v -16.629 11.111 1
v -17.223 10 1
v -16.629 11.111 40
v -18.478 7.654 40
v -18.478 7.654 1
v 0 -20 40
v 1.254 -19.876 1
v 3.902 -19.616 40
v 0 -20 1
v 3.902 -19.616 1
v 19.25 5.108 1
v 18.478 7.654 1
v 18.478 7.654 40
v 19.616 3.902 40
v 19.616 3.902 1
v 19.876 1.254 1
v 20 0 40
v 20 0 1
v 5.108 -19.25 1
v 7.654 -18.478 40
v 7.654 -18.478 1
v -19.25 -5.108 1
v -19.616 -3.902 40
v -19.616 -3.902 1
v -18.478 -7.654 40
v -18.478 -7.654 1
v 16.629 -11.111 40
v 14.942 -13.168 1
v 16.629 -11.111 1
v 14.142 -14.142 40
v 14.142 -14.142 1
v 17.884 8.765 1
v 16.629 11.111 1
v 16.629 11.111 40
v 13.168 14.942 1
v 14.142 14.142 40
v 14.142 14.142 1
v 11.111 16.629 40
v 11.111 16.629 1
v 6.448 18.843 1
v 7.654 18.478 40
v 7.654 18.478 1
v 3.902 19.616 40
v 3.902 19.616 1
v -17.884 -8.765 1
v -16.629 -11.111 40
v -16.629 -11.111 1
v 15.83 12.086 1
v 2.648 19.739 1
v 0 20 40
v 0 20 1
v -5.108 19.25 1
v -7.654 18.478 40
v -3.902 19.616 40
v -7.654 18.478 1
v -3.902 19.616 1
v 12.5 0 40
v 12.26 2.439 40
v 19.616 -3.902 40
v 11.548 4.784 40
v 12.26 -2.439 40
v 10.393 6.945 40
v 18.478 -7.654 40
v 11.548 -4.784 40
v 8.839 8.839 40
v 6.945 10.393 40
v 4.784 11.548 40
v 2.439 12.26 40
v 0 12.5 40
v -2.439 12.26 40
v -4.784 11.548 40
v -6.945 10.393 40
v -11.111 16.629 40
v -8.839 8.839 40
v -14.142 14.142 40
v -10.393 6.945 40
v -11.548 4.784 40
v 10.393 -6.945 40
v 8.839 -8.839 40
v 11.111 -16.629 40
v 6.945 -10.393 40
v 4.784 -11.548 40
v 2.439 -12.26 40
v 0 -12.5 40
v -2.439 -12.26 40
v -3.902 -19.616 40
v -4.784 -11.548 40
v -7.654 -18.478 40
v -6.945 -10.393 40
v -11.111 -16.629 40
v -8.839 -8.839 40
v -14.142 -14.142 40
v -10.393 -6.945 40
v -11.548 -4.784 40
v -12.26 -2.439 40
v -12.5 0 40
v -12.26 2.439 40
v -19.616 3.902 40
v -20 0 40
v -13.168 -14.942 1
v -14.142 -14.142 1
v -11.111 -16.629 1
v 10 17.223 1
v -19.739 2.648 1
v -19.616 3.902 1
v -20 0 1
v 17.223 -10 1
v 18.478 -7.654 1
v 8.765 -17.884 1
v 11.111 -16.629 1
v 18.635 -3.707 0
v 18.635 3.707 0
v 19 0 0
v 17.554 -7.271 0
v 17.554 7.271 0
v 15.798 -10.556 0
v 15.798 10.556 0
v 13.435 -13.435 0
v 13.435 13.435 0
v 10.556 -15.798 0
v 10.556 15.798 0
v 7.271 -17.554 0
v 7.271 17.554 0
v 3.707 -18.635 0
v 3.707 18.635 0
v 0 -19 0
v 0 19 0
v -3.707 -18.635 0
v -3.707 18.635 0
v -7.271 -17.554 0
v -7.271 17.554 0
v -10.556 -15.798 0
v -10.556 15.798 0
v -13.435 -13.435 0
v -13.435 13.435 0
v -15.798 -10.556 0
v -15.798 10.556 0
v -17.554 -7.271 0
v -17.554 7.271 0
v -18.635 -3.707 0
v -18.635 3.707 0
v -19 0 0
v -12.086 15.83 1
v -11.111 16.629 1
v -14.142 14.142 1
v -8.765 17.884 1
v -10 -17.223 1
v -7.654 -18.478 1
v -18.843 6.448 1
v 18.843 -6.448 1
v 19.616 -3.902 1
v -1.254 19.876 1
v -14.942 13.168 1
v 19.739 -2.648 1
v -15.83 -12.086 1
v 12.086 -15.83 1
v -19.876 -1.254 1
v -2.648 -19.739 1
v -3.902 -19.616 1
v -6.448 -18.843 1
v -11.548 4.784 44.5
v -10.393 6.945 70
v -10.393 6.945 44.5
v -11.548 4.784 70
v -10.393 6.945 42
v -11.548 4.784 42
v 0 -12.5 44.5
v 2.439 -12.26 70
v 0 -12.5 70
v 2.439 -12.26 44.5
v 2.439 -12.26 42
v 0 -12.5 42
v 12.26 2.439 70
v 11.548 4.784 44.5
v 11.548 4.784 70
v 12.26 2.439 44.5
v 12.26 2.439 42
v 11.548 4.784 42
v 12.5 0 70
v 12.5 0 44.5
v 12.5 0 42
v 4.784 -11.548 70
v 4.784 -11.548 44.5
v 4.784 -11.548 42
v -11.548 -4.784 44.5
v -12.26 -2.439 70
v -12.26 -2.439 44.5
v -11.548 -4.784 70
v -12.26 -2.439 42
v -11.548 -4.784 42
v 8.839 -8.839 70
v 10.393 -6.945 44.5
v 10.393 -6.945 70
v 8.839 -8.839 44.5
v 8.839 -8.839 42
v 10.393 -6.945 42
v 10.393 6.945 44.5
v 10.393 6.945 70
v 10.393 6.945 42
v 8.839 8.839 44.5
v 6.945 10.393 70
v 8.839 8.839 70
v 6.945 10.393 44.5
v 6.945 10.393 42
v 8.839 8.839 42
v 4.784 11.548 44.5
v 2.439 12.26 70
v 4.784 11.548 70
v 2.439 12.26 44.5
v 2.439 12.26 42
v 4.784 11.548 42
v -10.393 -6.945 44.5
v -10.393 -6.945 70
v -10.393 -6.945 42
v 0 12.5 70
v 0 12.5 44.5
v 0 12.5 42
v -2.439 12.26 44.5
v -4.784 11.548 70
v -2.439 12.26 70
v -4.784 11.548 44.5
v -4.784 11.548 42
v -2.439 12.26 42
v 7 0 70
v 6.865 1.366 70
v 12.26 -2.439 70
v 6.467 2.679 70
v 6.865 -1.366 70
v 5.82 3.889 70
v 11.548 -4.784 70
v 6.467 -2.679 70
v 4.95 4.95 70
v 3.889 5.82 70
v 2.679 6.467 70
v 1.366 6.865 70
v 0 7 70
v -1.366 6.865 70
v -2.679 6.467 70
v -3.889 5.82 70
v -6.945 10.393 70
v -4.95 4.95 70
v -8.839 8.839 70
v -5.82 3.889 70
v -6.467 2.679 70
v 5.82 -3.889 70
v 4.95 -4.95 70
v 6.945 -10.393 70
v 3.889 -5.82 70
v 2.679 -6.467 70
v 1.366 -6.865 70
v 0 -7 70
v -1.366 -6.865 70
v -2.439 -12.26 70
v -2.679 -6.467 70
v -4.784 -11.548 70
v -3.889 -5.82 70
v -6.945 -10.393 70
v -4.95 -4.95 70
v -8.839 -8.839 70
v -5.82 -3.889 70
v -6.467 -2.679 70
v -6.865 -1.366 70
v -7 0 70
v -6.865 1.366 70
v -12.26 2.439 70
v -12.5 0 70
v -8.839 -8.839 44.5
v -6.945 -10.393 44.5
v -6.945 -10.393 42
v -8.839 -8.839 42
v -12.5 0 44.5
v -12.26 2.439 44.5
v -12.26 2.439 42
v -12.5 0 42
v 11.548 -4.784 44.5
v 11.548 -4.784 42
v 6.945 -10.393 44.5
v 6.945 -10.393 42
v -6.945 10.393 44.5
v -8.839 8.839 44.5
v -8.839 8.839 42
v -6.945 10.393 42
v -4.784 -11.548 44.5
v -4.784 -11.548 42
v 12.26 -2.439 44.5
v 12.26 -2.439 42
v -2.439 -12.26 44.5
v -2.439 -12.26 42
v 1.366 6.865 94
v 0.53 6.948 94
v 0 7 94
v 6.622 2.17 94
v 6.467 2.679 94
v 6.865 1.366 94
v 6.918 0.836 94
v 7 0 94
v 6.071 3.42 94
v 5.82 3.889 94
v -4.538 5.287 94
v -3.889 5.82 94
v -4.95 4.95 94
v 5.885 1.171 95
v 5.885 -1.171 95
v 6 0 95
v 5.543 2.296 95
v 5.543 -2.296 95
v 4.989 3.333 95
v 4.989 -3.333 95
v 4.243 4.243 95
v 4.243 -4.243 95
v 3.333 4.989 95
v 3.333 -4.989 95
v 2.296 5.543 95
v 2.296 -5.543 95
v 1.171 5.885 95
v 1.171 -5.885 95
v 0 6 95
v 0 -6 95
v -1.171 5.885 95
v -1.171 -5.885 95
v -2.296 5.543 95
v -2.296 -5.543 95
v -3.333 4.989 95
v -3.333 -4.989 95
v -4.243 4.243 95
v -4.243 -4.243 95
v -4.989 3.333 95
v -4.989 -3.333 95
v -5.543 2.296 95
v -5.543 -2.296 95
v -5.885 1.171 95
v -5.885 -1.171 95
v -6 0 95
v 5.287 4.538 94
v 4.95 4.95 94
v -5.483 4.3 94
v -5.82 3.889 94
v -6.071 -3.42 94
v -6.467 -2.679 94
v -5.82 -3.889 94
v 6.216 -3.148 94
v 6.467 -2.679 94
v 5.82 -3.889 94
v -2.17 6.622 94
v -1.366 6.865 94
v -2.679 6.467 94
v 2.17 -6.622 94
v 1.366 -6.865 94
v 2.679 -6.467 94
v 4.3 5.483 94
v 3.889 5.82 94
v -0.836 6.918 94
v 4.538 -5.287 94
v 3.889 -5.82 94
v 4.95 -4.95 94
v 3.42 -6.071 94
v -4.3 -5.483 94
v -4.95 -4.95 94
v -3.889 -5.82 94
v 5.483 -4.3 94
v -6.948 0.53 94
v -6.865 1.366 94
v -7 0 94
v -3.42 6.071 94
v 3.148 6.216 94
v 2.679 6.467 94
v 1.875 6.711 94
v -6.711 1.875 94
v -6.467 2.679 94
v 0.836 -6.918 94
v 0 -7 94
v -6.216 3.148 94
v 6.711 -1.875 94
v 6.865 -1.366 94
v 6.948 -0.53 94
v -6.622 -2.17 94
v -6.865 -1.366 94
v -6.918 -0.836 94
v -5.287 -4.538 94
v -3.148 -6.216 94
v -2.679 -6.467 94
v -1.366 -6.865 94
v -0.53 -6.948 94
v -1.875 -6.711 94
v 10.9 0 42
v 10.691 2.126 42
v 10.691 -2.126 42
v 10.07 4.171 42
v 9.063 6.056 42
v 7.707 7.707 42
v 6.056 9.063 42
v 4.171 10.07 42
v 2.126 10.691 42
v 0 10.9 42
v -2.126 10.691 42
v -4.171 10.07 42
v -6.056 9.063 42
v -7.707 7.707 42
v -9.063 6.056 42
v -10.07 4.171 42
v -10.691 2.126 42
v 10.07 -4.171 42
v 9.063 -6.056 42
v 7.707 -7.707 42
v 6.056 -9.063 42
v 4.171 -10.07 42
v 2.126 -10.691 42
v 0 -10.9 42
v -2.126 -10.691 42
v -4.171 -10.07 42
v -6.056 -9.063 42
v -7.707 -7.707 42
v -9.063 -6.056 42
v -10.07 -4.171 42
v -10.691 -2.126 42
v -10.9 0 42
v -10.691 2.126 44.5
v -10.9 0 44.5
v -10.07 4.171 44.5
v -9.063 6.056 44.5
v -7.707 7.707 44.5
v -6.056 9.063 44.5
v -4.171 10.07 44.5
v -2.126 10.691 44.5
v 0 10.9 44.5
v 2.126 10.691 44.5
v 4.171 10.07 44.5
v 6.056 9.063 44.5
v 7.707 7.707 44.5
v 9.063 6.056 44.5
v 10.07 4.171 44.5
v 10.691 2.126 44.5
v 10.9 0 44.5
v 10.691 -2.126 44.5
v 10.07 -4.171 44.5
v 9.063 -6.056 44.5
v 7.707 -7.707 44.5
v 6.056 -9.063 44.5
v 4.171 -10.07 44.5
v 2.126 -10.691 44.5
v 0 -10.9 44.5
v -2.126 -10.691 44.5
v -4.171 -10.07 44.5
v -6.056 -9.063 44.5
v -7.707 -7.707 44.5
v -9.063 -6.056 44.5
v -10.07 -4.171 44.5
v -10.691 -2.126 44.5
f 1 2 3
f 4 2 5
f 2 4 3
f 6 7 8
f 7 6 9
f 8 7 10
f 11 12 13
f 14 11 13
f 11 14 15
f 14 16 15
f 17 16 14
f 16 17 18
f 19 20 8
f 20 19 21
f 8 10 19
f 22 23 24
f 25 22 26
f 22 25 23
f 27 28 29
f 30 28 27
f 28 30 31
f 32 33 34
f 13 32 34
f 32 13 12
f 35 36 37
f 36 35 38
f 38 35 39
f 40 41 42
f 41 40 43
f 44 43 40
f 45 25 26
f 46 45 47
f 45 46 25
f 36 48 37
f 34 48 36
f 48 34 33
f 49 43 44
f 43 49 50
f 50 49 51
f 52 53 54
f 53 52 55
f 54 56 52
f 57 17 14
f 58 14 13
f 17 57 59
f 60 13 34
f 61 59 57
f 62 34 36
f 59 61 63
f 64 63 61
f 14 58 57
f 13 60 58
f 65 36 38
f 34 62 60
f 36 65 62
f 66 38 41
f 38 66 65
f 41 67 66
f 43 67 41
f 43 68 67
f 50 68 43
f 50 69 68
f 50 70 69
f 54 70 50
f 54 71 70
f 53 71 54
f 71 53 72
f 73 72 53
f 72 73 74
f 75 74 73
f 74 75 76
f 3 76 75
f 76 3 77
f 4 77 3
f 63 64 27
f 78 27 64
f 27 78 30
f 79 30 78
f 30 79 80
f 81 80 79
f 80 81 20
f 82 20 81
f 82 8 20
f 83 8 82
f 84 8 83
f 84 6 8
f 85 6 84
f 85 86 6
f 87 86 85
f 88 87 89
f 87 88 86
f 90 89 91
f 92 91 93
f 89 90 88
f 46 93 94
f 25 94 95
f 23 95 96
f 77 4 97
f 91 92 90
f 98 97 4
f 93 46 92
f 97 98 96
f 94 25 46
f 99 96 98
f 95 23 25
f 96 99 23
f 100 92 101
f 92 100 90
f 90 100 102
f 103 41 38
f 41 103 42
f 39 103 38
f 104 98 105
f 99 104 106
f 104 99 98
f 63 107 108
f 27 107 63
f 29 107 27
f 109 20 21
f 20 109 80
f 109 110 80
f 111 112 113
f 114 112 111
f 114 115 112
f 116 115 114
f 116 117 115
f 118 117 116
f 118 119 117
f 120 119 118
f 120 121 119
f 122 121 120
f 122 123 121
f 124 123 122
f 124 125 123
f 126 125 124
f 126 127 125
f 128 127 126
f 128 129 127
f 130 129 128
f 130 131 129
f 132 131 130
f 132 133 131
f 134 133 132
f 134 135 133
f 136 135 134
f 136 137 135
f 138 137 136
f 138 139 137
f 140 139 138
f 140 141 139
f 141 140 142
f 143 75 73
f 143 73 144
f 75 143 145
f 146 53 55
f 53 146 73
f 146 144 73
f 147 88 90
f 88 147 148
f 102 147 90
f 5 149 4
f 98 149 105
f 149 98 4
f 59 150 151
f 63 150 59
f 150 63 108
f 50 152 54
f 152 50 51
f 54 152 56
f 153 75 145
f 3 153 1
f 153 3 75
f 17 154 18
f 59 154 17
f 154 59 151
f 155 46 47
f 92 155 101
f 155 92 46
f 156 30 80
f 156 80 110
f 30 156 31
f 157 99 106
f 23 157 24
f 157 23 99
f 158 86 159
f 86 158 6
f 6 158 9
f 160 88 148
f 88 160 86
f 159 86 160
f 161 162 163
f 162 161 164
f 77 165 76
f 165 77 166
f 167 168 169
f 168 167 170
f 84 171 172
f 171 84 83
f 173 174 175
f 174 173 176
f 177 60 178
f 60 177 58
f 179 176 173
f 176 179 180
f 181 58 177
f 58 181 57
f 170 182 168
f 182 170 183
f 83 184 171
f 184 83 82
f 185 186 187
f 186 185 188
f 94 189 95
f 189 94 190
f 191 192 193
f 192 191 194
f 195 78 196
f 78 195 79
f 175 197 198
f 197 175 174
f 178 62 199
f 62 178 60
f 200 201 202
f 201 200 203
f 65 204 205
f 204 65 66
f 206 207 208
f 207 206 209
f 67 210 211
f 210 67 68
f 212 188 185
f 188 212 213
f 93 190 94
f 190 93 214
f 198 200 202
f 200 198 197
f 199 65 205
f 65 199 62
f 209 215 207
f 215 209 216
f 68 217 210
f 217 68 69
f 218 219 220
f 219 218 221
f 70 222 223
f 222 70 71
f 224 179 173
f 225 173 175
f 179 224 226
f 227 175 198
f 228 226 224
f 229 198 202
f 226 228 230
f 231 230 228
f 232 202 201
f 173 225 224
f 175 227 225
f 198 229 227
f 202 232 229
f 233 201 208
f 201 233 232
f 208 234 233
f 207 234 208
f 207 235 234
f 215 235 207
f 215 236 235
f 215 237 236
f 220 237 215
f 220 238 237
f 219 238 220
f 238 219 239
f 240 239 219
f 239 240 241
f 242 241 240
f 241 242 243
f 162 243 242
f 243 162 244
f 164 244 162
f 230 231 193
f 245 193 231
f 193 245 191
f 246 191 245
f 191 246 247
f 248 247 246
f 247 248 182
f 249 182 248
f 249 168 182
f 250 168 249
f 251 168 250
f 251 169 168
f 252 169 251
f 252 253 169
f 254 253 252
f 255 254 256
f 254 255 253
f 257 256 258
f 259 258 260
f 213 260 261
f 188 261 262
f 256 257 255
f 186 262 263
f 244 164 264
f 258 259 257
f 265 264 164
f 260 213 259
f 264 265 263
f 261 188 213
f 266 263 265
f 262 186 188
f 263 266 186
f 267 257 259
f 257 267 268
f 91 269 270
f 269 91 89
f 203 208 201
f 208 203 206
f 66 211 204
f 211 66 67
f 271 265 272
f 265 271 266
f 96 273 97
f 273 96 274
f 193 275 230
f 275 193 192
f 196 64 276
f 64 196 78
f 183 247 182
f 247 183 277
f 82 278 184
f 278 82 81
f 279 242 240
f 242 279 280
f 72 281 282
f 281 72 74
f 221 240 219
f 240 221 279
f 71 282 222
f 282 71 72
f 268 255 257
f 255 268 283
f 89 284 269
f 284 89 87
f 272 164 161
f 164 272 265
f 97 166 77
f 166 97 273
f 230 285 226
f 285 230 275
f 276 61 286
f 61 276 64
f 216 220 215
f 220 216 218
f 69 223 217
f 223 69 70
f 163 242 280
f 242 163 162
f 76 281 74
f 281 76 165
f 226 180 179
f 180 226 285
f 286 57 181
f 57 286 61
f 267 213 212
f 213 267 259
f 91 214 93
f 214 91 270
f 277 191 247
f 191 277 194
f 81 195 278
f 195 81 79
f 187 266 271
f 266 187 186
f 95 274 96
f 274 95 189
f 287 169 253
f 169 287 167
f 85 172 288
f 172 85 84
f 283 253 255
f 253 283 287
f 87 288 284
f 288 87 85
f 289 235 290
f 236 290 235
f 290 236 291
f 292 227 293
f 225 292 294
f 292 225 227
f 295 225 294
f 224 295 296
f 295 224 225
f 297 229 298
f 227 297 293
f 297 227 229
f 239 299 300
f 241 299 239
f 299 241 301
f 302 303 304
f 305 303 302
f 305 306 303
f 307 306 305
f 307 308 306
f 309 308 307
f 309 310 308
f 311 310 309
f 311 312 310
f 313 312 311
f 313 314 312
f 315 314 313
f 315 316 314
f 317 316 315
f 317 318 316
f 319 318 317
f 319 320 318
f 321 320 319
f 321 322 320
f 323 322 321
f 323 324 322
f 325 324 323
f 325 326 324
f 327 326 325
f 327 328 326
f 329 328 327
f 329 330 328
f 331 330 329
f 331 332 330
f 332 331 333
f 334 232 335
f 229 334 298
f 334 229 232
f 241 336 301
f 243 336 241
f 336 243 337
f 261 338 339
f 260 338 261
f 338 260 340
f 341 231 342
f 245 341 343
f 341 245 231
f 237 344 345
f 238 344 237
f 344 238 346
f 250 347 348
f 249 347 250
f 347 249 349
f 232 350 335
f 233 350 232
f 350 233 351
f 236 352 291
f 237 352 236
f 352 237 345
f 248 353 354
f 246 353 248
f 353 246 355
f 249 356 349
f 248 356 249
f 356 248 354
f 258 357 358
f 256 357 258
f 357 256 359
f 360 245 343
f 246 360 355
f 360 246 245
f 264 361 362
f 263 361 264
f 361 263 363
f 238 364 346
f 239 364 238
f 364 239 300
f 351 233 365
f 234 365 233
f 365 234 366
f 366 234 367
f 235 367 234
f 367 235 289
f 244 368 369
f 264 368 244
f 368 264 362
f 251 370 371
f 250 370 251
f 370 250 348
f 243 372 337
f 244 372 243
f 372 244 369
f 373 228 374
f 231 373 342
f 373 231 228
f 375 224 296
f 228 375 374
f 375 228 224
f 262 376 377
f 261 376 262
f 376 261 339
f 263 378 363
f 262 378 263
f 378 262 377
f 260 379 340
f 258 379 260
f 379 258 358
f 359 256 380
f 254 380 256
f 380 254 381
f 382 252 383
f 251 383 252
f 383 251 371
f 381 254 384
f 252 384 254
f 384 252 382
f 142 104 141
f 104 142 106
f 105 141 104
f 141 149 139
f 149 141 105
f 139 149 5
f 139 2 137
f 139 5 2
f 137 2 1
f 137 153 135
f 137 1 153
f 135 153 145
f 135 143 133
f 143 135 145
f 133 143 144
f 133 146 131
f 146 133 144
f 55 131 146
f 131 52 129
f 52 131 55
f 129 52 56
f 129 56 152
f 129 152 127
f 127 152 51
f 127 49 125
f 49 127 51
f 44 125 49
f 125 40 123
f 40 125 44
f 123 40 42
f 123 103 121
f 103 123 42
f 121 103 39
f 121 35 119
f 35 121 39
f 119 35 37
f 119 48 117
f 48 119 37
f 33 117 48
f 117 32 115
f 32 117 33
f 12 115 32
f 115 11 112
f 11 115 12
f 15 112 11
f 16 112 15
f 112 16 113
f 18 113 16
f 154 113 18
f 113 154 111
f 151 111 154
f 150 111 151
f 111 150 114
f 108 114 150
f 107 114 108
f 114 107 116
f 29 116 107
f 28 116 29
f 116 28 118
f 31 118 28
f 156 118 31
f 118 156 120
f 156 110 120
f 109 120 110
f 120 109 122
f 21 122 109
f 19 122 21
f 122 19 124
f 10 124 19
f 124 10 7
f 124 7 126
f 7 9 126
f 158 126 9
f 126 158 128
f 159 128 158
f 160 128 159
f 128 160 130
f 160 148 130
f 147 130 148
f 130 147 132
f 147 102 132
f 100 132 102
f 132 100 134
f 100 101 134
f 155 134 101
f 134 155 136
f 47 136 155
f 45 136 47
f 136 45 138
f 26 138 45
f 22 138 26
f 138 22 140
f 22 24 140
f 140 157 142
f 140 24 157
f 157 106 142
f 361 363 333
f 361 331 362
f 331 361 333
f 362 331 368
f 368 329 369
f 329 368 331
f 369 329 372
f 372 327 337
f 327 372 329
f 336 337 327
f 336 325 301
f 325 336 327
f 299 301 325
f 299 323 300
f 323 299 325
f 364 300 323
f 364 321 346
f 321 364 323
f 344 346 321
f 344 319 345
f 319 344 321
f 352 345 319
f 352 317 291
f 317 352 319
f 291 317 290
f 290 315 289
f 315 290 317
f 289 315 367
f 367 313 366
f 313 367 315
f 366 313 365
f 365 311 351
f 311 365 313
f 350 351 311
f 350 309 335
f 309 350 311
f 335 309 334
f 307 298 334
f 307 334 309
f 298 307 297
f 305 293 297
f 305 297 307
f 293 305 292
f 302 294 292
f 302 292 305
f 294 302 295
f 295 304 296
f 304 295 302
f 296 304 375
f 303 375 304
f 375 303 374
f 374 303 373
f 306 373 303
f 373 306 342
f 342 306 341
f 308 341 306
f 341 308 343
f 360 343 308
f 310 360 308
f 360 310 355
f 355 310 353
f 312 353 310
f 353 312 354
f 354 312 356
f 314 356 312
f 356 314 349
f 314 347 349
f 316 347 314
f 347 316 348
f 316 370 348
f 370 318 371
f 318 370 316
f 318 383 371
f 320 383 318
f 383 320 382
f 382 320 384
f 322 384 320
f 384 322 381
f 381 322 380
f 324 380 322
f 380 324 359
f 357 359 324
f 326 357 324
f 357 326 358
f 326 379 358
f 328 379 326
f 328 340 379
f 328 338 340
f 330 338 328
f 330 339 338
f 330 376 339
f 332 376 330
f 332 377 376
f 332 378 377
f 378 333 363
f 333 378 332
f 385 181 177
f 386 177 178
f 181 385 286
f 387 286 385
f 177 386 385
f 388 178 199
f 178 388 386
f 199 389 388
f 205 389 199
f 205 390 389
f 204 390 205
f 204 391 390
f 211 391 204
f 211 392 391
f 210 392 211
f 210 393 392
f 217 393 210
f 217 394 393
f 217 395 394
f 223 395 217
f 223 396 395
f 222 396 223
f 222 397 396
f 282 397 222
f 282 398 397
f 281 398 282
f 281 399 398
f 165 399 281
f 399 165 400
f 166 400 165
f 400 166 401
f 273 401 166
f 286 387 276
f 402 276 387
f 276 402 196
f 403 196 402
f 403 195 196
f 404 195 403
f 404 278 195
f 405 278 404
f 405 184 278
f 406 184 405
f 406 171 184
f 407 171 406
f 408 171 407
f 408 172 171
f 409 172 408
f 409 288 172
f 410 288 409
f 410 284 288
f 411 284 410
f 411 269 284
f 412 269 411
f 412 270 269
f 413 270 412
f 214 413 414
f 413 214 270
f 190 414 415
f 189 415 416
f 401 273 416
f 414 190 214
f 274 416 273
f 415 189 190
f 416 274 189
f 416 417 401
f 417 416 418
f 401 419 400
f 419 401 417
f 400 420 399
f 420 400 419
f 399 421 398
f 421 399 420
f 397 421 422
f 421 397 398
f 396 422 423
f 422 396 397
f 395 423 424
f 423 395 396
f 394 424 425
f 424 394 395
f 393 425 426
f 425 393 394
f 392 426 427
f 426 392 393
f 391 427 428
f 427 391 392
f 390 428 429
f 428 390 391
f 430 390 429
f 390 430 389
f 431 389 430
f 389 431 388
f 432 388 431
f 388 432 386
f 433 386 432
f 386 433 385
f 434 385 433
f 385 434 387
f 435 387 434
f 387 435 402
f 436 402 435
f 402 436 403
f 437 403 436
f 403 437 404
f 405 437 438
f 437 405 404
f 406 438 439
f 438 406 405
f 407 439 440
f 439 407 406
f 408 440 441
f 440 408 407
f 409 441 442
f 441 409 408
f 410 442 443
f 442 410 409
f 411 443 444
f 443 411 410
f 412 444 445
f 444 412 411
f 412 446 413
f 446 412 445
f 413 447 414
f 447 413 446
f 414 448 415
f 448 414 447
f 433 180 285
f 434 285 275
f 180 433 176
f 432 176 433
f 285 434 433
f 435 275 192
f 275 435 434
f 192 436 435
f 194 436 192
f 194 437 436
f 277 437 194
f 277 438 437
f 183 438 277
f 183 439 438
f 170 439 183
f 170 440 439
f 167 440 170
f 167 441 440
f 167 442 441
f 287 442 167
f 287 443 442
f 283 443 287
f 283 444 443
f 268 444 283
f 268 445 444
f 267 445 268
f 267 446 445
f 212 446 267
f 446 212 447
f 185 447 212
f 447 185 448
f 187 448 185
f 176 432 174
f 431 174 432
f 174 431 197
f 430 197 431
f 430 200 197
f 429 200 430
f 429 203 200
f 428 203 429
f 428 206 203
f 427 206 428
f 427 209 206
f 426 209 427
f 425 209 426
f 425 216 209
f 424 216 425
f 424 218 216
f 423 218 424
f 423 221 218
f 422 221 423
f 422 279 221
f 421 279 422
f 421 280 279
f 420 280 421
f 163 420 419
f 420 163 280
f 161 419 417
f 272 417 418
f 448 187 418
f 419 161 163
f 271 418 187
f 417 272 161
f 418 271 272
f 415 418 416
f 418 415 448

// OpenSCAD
$fn = 32;

// ----------------------------------------------------------------------
// Stepped shaft: diameters 40, 25, 14 mm, 95 mm long
// ----------------------------------------------------------------------

// --- parameters (mm) ---
d1 = 40;                  // step 1 diameter
len1 = 40;                // step 1 length
d2 = 25;                  // step 2 diameter
len2 = 30;                // step 2 length
d3 = 14;                  // step 3 diameter
len3 = 25;                // step 3 length
total = 95;               // overall length
chamfer = 1;              // end chamfer
groove_r = 12.5;          // groove radius
groove_z = 42;            // groove position from the end
groove_w = 2.5;           // groove width
groove_d = 1.6;           // groove depth

difference() {
  /* turned body: stacked cylinders, every step sunk into the bigger one */
  union() {
    cylinder(h = len1, d = d1);
    translate([0, 0, 39.6]) cylinder(h = 30.4, d = d2);
    translate([0, 0, 69.6]) cylinder(h = 25.4, d = d3);
  }
  /* bottom chamfer ring cut */
  rotate_extrude() translate([19, -2.5]) polygon([[0, 0], [3.5, 0], [3.5, 6], [0, 2.5]]);
  /* top chamfer ring cut */
  rotate_extrude() translate([6, 95]) polygon([[0, 0], [3.5, -3.5], [3.5, 2.5], [0, 2.5]]);
  /* circlip groove just behind the shoulder */
  rotate_extrude() translate([groove_r - groove_d, groove_z]) square([groove_d + 2.5, groove_w]);
}
